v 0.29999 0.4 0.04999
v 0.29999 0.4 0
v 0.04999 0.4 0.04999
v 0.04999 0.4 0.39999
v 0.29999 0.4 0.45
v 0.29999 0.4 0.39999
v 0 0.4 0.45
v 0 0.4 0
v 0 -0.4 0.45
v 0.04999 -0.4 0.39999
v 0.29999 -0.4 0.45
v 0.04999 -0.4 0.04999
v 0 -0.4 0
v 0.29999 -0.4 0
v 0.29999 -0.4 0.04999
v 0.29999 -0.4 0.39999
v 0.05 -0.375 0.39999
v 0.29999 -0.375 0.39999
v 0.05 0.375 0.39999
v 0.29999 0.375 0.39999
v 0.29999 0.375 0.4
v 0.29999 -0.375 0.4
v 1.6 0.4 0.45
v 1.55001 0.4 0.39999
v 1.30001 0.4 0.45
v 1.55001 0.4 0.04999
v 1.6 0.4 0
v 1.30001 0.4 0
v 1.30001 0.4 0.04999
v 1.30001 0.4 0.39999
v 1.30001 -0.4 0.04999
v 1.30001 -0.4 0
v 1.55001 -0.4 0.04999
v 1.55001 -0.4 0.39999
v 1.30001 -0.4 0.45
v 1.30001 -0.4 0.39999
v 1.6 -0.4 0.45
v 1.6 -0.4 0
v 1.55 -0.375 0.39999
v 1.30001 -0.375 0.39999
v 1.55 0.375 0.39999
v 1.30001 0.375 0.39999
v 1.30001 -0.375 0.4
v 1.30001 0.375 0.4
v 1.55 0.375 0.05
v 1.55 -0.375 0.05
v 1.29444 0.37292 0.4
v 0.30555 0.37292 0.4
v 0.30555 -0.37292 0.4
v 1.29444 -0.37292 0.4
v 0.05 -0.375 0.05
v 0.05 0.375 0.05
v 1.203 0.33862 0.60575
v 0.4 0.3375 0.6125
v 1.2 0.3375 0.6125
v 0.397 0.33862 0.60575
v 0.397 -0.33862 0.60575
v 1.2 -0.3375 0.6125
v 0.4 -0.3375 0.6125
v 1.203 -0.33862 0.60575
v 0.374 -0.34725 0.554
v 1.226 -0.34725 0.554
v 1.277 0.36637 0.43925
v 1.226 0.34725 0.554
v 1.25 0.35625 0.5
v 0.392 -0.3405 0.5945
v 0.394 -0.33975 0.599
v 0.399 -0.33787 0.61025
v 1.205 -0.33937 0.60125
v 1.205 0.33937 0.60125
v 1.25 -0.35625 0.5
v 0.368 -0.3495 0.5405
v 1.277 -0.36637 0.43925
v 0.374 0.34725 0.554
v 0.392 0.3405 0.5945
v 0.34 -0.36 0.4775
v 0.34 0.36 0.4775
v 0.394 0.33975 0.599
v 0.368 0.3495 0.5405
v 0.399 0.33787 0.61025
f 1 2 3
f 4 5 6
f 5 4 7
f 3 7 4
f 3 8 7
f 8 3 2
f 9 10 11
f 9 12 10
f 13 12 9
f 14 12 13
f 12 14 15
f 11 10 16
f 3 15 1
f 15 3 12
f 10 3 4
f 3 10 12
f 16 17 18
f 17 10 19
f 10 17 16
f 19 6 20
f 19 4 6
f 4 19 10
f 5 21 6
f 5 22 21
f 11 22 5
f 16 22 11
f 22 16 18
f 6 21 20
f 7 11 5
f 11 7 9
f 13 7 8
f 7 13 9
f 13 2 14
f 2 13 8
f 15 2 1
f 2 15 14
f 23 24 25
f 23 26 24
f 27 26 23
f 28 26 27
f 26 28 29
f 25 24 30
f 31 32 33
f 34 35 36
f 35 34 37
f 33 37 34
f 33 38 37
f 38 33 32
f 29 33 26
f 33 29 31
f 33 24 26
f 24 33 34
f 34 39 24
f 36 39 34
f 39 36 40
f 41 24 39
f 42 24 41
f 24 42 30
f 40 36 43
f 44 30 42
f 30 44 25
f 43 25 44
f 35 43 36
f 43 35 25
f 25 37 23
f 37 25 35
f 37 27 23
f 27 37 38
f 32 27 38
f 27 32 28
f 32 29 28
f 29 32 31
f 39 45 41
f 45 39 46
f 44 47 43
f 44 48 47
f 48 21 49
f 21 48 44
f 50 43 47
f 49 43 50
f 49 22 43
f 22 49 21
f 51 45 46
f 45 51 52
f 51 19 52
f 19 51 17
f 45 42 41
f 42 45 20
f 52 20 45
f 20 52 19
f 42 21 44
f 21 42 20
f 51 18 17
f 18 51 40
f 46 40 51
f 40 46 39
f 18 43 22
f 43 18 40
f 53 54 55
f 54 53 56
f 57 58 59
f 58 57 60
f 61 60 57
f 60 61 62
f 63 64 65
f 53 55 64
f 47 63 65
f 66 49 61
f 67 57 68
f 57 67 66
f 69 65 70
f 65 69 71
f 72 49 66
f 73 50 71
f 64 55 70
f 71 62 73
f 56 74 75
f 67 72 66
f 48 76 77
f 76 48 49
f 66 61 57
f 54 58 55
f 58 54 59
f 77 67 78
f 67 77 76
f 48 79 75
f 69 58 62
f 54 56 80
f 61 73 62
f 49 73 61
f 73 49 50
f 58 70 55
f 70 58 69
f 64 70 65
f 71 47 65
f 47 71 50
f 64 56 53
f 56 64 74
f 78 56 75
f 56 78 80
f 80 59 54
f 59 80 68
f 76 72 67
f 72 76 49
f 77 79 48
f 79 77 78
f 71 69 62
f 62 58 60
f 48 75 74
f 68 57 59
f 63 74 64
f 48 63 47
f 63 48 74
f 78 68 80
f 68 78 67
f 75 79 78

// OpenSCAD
// Can be 00105,0201,0402,0603,0805,1206,1210,2010 or 2512
type="0603";

th = 0.05;

th = type=="00105" ? 0.02:
    type=="0201" ? 0.03:
    type=="0402" ? 0.04: 0.05;

l = type=="00105" ? 0.4:
    type=="0201" ? 0.6:
    type=="0402" ? 1.0:
    type=="0603" ? 1.6:
    type=="0805" ? 2.0 :
	type=="1206" ? 3.1:
	type=="1210" ? 3.2:
	type=="2010" ? 5.0:
	type=="2512" ? 6.35: 0;

w = type=="00105" ? 0.2:
    type=="0201" ? 0.3:
    type=="0402" ? 0.5:
    type=="0603" ? 0.8:
    type=="0805" ? 1.25 :
	type=="1206" ? 1.55:
	type=="1210" ? 2.6:
	type=="2010" ? 2.5:
	type=="2512" ? 3.2: 0;

t = type=="00105" ? 0.13:
    type=="0201" ? 0.23:
    type=="0402" ? 0.35:
    type=="0603" ? 0.45:
    type=="0805" ? 0.5 :
	type=="1206" ? 0.55:
	type=="1210" ? 0.55:
	type=="2010" ? 0.55:
	type=="2512" ? 0.55: 0;

d1 = type=="00105" ? 0.1:
    type=="0201" ? 0.15:
    type=="0402" ? 0.20:
    type=="0603" ? 0.30:
    type=="0805" ? 0.35:
	type=="1206" ? 0.50:
	type=="1210" ? 0.50:
	type=="2010" ? 0.60:
	type=="2512" ? 0.60: 0;

d2 = type=="00105" ? 0.1:
    type=="0201" ? 0.15:
    type=="0402" ? 0.20:
    type=="0603" ? 0.30:
    type=="0805" ? 0.40:
	type=="1206" ? 0.50:
	type=="1210" ? 0.50:
	type=="2010" ? 0.50:
	type=="2512" ? 0.50: 0;

module pin()
{
	rotate([90,0,0])
		linear_extrude(height = w, center = true, convexity = 10, twist = 0)
			polygon([[0,0],[d2,0],[d2,th],[th,th],[th,t-th],[d1,t-th],[d1,t],[0,t]]);
}


pin();
translate([l,0,0])
mirror([1,0,0])
pin();

translate([th,-(w-th)/2,th])
cube([l-th*2,w-th,t-th*2]);

translate([l/2,0,t+th])
linear_extrude(height = t/2, center = true, convexity = 10, scale=[0.8,0.9], $fn=100)    
    polygon(points=[[-l/2+d1,-w/2+th/2],[l/2-d1,-w/2+th/2],[l/2-d1,w/2-th/2],[-l/2+d1,w/2-th/2]], paths=[[0,1,2,3,4]]);
